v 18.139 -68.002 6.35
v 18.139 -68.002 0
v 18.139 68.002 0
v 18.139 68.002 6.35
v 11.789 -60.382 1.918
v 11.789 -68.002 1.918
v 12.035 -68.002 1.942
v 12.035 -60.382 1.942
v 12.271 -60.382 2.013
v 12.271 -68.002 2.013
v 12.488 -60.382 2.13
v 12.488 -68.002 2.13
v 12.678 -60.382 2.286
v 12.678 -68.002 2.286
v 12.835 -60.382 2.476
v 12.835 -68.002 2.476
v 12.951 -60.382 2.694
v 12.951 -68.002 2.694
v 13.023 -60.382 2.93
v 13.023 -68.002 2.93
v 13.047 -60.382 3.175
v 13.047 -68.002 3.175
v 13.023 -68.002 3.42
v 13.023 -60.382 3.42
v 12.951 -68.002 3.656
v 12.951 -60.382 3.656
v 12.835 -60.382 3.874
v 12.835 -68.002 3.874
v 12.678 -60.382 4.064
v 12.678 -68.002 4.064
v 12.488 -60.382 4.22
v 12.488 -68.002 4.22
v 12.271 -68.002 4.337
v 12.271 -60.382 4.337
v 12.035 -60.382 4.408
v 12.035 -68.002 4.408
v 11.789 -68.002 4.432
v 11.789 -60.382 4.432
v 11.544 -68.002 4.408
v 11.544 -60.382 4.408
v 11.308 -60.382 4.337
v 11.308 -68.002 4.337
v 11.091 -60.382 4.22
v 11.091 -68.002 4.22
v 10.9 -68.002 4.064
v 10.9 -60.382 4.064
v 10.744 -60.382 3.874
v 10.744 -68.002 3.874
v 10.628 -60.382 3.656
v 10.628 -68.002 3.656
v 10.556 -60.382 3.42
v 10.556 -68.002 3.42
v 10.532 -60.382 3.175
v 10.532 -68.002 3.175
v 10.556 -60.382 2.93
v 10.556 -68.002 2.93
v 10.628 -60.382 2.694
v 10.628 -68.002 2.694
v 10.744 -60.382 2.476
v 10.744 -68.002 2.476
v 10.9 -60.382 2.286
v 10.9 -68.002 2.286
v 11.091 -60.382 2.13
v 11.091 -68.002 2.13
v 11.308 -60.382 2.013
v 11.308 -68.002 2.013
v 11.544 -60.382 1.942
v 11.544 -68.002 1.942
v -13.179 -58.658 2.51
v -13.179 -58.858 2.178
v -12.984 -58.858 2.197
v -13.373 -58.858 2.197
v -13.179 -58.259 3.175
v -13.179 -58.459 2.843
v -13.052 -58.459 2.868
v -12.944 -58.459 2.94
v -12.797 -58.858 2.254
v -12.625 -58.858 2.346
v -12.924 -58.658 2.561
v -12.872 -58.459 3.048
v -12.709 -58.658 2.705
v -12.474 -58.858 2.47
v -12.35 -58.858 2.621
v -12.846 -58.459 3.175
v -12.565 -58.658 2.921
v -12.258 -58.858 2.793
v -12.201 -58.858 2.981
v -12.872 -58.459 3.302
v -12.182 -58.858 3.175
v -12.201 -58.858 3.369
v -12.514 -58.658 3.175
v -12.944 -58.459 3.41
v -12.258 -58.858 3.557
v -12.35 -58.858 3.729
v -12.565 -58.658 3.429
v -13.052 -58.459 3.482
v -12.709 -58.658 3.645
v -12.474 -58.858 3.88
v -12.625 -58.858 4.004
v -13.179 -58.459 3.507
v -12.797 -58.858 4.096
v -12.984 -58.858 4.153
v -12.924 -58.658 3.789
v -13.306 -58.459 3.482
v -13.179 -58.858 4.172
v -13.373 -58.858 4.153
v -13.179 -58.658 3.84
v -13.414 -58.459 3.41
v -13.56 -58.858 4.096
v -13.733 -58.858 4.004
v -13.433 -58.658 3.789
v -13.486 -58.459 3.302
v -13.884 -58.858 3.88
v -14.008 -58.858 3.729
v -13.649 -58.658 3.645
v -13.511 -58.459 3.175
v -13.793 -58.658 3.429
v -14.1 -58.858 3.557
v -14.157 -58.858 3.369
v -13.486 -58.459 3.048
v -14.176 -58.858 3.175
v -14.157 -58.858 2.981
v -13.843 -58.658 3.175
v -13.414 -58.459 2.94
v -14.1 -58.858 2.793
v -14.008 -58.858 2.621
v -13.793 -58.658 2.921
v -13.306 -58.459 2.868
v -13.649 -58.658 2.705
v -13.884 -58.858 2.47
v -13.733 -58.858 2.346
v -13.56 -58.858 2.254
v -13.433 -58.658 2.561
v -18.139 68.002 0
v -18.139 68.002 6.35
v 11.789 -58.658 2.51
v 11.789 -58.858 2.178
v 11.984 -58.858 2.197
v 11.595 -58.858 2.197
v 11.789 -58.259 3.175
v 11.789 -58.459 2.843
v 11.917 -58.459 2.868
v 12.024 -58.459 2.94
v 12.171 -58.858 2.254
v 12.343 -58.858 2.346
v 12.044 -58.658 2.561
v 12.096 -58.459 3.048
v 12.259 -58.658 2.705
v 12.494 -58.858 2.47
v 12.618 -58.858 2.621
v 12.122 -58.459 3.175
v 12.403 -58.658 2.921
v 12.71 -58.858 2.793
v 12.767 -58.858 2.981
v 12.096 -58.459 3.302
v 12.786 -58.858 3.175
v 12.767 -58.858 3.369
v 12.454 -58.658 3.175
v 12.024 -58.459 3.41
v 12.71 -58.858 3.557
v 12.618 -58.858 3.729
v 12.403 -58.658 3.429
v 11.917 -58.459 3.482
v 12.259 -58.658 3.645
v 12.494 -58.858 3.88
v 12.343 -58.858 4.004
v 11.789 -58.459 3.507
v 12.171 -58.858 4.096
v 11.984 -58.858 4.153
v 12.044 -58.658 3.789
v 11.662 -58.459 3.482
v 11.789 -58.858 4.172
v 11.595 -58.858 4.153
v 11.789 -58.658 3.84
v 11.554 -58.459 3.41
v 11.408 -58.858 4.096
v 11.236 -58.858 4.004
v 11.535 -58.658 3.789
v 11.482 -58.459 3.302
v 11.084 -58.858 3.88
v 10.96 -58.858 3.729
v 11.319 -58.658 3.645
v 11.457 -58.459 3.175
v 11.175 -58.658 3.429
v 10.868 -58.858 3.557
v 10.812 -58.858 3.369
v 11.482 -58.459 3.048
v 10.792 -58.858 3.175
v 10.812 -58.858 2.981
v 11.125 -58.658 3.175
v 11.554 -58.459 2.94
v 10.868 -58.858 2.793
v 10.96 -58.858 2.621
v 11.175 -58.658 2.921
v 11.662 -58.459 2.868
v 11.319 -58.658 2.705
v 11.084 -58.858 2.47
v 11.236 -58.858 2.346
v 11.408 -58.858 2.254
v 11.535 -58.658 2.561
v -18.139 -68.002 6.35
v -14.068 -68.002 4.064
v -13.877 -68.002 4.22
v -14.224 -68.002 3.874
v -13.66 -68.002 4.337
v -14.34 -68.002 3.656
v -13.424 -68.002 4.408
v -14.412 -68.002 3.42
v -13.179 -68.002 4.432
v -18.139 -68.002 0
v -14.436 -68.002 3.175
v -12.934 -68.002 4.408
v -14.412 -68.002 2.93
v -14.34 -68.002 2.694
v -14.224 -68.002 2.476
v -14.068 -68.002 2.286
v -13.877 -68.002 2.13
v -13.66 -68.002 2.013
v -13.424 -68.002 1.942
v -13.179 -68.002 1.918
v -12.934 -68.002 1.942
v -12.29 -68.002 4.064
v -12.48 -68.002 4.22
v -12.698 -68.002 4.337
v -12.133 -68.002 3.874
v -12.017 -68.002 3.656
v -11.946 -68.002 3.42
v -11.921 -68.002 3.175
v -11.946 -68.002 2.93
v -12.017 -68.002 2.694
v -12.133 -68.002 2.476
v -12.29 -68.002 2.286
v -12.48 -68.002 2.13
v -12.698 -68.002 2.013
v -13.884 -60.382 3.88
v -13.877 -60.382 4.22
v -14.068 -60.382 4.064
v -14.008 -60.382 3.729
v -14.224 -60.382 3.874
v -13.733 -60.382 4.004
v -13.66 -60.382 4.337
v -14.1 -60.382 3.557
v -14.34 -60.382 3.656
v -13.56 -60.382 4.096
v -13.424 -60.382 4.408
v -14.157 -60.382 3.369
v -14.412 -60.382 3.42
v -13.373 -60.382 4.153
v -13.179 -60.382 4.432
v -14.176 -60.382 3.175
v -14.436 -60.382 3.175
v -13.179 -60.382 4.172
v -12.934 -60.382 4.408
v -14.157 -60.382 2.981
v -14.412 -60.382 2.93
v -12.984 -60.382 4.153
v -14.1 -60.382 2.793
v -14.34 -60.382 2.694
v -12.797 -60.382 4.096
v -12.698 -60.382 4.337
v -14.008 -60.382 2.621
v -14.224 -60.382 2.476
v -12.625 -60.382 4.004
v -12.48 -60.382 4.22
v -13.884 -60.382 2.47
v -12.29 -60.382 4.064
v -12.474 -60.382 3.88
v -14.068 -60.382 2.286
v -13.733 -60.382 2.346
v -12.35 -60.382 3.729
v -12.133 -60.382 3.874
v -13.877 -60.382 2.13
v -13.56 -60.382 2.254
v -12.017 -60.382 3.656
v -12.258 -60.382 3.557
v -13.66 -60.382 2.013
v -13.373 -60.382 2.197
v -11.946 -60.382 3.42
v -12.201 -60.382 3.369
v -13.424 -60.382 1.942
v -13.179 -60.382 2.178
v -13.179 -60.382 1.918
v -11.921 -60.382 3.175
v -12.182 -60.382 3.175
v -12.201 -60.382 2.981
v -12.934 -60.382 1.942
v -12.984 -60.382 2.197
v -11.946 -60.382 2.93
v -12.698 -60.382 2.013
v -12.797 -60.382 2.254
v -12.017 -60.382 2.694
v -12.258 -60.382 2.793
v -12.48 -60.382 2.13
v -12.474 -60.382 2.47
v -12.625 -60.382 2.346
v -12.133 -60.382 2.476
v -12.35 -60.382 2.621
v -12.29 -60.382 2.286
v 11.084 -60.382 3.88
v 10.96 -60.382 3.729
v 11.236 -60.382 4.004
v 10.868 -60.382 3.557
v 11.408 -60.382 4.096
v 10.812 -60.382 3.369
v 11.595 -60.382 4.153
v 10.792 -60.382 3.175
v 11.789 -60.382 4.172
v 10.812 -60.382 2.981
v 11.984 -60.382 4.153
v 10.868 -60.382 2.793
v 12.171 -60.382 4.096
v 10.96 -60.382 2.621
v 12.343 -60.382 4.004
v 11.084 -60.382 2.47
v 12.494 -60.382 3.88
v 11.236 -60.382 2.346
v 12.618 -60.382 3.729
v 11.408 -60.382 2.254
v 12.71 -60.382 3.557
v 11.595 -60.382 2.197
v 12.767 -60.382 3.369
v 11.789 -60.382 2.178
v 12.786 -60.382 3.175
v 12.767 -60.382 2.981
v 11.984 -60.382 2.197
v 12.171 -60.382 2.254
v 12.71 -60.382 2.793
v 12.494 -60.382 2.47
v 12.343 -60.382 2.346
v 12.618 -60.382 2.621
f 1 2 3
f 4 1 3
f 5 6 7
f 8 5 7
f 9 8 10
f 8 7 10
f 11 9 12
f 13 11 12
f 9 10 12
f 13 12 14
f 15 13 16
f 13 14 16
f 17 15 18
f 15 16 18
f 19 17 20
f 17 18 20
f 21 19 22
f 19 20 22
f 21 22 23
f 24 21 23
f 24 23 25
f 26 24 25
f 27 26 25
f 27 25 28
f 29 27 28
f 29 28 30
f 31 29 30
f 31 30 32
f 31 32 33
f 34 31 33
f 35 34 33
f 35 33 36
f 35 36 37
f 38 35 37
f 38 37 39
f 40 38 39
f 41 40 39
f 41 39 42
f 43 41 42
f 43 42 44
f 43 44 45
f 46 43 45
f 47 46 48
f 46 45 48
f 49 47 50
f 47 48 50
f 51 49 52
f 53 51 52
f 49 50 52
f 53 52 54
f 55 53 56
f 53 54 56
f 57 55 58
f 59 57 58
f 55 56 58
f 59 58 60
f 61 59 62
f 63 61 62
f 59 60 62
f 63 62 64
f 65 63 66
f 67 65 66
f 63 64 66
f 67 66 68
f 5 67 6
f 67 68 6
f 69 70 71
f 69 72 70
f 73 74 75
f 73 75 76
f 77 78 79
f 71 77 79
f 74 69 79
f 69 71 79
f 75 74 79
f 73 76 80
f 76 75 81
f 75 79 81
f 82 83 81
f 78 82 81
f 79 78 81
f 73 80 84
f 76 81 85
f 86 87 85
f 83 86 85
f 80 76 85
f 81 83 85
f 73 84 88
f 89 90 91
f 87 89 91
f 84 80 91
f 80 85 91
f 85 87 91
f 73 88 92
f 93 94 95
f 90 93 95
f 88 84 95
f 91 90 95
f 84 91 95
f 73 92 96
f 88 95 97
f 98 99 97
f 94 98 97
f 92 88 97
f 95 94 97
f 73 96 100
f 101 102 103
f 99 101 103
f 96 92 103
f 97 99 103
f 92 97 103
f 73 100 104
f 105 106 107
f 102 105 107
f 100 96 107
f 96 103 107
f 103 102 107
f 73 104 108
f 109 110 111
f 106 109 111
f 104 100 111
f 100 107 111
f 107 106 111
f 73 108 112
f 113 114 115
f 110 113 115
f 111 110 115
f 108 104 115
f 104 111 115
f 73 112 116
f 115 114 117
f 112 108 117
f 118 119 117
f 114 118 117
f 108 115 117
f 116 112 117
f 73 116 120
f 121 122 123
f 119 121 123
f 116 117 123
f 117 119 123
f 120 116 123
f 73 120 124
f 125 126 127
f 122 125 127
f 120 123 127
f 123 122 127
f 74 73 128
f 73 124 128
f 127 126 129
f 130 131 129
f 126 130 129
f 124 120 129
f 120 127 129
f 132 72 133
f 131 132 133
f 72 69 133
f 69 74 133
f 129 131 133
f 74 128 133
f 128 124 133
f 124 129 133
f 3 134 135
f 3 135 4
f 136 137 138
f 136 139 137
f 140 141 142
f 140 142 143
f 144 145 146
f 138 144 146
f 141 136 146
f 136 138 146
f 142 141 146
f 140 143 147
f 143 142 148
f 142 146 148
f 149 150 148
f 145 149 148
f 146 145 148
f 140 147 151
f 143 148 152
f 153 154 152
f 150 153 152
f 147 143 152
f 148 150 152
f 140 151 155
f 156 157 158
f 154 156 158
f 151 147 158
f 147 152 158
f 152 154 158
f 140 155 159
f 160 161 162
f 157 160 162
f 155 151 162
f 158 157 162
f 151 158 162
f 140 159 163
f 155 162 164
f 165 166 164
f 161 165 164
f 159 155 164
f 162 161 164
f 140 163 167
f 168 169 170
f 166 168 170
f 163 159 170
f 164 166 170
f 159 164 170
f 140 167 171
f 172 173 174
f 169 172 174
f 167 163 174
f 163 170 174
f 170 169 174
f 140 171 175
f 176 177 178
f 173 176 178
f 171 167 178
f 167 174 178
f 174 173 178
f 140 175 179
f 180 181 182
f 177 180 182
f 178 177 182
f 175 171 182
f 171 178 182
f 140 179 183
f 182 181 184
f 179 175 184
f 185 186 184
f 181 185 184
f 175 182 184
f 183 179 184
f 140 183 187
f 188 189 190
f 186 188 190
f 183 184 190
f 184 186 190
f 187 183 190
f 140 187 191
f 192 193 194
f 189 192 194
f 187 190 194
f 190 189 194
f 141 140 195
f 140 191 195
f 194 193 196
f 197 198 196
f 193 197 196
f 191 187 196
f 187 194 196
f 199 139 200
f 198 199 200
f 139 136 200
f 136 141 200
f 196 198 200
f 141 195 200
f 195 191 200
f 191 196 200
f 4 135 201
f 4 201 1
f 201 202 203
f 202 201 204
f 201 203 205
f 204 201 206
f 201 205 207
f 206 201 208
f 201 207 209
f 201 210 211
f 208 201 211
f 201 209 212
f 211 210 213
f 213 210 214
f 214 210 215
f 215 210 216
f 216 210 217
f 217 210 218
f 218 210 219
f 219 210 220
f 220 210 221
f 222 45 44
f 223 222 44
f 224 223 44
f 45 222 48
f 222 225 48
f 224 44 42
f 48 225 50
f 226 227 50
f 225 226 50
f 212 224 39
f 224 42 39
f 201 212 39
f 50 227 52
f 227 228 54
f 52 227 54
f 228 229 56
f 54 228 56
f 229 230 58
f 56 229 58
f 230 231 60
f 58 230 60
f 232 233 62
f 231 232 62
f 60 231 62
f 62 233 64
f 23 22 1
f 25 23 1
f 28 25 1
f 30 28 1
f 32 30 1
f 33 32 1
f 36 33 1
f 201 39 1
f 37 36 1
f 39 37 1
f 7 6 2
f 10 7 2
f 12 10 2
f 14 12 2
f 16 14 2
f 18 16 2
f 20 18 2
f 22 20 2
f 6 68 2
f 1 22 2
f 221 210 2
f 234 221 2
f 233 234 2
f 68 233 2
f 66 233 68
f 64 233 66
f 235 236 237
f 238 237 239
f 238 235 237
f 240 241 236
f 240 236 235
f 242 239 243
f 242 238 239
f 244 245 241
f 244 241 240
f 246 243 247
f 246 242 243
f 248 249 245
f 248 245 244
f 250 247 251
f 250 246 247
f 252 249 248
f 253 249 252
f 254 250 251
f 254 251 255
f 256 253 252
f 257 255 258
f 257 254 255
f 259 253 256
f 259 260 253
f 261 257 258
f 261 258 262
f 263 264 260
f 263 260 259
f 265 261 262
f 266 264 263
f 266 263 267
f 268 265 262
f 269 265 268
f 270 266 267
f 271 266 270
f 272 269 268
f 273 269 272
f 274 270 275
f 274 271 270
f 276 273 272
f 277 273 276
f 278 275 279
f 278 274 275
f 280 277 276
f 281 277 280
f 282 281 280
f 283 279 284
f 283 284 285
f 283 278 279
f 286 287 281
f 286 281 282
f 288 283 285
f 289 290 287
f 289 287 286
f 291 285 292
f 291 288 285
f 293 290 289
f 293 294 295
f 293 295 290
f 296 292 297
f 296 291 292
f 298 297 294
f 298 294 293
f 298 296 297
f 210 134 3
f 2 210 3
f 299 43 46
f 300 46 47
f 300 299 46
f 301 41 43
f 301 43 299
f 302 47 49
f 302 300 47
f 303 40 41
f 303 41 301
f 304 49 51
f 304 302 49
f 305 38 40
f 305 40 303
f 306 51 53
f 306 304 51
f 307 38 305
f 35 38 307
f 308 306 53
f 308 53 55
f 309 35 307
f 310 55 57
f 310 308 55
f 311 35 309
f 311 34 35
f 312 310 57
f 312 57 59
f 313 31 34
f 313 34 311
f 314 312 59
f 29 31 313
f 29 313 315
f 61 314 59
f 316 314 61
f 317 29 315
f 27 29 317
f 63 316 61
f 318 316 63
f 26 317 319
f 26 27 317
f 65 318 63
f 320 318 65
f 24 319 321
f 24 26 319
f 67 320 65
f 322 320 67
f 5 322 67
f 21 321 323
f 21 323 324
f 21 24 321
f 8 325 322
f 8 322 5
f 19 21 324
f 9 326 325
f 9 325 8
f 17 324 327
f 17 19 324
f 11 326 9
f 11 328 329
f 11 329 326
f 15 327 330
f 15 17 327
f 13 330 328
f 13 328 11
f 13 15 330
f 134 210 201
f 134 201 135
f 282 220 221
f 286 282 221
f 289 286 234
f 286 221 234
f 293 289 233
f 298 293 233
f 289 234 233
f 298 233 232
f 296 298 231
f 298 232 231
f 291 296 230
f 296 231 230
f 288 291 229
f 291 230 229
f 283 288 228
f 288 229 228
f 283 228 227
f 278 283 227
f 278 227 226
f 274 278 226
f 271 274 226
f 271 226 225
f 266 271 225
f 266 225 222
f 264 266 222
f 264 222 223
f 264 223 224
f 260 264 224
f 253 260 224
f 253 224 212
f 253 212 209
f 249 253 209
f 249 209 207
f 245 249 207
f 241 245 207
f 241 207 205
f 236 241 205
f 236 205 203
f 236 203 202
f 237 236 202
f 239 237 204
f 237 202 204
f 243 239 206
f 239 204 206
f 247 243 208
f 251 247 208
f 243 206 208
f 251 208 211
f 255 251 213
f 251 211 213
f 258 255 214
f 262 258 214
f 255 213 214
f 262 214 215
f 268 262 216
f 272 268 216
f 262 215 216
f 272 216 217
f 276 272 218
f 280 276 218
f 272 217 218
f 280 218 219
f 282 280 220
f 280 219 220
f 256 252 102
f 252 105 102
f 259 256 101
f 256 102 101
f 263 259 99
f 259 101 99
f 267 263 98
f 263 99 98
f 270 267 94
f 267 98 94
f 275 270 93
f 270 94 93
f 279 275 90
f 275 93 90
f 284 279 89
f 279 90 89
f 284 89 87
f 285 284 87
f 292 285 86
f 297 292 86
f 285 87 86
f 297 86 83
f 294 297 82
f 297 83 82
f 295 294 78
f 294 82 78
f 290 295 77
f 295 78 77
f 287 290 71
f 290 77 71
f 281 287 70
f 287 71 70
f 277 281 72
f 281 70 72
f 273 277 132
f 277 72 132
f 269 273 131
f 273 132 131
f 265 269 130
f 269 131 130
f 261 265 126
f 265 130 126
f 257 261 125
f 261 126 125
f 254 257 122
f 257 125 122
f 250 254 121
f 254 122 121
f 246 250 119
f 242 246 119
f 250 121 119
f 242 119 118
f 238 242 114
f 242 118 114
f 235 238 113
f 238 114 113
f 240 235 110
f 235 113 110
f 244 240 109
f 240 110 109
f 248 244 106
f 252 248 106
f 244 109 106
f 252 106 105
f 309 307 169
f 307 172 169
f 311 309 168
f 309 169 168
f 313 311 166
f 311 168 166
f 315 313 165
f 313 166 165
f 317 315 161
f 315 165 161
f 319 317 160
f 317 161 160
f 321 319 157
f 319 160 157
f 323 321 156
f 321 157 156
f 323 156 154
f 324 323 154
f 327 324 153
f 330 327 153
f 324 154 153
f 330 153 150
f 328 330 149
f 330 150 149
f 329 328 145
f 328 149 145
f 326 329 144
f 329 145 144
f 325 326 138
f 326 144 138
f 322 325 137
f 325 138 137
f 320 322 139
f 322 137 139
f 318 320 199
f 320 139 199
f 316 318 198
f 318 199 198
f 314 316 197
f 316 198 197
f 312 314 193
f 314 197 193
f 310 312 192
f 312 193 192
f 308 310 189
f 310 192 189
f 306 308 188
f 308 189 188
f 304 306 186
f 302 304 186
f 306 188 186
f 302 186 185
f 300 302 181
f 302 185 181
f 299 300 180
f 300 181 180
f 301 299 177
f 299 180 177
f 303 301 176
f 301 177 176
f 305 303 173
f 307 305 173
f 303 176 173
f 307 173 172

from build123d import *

# Parameters (mm, degrees)
SKETCH1_W                       = 36.27882
SKETCH1_H                       = 136.0043
EXTRUDE1_DEPTH                  = 6.35
F_3_48_TAPPED_HOLE1_D           = 1.9939
F_3_48_TAPPED_HOLE1_DEPTH       = 9.144
F_3_48_TAPPED_HOLE1_CBORE_D     = 2.5146
F_3_48_TAPPED_HOLE1_CBORE_DEPTH = 7.62
F_3_48_TAPPED_HOLE1_TIP         = 0.599027994


with BuildPart() as part:
    # Sketch1 → Extrude1 (new body)
    with BuildSketch(Plane.XY):
        Rectangle(SKETCH1_W, SKETCH1_H)
    extrude(amount=EXTRUDE1_DEPTH)

    # #3-48 Tapped Hole1
    with Locations(Plane(origin=(-14.071004552, -68.00215, 88.900648793), x_dir=(0, 0, -1), z_dir=(0, -1, 0))):
        with Locations((85.725648793, 25.860414552), (85.725648793, 0.892214552)):
            CounterBoreHole(F_3_48_TAPPED_HOLE1_D / 2, F_3_48_TAPPED_HOLE1_CBORE_D / 2, F_3_48_TAPPED_HOLE1_CBORE_DEPTH, depth=F_3_48_TAPPED_HOLE1_DEPTH)
            with Locations((0, 0, -(F_3_48_TAPPED_HOLE1_DEPTH + F_3_48_TAPPED_HOLE1_TIP / 2))):  # 118° drill point
                Cone(0, F_3_48_TAPPED_HOLE1_D / 2, F_3_48_TAPPED_HOLE1_TIP, mode=Mode.SUBTRACT)


solid = part.part
